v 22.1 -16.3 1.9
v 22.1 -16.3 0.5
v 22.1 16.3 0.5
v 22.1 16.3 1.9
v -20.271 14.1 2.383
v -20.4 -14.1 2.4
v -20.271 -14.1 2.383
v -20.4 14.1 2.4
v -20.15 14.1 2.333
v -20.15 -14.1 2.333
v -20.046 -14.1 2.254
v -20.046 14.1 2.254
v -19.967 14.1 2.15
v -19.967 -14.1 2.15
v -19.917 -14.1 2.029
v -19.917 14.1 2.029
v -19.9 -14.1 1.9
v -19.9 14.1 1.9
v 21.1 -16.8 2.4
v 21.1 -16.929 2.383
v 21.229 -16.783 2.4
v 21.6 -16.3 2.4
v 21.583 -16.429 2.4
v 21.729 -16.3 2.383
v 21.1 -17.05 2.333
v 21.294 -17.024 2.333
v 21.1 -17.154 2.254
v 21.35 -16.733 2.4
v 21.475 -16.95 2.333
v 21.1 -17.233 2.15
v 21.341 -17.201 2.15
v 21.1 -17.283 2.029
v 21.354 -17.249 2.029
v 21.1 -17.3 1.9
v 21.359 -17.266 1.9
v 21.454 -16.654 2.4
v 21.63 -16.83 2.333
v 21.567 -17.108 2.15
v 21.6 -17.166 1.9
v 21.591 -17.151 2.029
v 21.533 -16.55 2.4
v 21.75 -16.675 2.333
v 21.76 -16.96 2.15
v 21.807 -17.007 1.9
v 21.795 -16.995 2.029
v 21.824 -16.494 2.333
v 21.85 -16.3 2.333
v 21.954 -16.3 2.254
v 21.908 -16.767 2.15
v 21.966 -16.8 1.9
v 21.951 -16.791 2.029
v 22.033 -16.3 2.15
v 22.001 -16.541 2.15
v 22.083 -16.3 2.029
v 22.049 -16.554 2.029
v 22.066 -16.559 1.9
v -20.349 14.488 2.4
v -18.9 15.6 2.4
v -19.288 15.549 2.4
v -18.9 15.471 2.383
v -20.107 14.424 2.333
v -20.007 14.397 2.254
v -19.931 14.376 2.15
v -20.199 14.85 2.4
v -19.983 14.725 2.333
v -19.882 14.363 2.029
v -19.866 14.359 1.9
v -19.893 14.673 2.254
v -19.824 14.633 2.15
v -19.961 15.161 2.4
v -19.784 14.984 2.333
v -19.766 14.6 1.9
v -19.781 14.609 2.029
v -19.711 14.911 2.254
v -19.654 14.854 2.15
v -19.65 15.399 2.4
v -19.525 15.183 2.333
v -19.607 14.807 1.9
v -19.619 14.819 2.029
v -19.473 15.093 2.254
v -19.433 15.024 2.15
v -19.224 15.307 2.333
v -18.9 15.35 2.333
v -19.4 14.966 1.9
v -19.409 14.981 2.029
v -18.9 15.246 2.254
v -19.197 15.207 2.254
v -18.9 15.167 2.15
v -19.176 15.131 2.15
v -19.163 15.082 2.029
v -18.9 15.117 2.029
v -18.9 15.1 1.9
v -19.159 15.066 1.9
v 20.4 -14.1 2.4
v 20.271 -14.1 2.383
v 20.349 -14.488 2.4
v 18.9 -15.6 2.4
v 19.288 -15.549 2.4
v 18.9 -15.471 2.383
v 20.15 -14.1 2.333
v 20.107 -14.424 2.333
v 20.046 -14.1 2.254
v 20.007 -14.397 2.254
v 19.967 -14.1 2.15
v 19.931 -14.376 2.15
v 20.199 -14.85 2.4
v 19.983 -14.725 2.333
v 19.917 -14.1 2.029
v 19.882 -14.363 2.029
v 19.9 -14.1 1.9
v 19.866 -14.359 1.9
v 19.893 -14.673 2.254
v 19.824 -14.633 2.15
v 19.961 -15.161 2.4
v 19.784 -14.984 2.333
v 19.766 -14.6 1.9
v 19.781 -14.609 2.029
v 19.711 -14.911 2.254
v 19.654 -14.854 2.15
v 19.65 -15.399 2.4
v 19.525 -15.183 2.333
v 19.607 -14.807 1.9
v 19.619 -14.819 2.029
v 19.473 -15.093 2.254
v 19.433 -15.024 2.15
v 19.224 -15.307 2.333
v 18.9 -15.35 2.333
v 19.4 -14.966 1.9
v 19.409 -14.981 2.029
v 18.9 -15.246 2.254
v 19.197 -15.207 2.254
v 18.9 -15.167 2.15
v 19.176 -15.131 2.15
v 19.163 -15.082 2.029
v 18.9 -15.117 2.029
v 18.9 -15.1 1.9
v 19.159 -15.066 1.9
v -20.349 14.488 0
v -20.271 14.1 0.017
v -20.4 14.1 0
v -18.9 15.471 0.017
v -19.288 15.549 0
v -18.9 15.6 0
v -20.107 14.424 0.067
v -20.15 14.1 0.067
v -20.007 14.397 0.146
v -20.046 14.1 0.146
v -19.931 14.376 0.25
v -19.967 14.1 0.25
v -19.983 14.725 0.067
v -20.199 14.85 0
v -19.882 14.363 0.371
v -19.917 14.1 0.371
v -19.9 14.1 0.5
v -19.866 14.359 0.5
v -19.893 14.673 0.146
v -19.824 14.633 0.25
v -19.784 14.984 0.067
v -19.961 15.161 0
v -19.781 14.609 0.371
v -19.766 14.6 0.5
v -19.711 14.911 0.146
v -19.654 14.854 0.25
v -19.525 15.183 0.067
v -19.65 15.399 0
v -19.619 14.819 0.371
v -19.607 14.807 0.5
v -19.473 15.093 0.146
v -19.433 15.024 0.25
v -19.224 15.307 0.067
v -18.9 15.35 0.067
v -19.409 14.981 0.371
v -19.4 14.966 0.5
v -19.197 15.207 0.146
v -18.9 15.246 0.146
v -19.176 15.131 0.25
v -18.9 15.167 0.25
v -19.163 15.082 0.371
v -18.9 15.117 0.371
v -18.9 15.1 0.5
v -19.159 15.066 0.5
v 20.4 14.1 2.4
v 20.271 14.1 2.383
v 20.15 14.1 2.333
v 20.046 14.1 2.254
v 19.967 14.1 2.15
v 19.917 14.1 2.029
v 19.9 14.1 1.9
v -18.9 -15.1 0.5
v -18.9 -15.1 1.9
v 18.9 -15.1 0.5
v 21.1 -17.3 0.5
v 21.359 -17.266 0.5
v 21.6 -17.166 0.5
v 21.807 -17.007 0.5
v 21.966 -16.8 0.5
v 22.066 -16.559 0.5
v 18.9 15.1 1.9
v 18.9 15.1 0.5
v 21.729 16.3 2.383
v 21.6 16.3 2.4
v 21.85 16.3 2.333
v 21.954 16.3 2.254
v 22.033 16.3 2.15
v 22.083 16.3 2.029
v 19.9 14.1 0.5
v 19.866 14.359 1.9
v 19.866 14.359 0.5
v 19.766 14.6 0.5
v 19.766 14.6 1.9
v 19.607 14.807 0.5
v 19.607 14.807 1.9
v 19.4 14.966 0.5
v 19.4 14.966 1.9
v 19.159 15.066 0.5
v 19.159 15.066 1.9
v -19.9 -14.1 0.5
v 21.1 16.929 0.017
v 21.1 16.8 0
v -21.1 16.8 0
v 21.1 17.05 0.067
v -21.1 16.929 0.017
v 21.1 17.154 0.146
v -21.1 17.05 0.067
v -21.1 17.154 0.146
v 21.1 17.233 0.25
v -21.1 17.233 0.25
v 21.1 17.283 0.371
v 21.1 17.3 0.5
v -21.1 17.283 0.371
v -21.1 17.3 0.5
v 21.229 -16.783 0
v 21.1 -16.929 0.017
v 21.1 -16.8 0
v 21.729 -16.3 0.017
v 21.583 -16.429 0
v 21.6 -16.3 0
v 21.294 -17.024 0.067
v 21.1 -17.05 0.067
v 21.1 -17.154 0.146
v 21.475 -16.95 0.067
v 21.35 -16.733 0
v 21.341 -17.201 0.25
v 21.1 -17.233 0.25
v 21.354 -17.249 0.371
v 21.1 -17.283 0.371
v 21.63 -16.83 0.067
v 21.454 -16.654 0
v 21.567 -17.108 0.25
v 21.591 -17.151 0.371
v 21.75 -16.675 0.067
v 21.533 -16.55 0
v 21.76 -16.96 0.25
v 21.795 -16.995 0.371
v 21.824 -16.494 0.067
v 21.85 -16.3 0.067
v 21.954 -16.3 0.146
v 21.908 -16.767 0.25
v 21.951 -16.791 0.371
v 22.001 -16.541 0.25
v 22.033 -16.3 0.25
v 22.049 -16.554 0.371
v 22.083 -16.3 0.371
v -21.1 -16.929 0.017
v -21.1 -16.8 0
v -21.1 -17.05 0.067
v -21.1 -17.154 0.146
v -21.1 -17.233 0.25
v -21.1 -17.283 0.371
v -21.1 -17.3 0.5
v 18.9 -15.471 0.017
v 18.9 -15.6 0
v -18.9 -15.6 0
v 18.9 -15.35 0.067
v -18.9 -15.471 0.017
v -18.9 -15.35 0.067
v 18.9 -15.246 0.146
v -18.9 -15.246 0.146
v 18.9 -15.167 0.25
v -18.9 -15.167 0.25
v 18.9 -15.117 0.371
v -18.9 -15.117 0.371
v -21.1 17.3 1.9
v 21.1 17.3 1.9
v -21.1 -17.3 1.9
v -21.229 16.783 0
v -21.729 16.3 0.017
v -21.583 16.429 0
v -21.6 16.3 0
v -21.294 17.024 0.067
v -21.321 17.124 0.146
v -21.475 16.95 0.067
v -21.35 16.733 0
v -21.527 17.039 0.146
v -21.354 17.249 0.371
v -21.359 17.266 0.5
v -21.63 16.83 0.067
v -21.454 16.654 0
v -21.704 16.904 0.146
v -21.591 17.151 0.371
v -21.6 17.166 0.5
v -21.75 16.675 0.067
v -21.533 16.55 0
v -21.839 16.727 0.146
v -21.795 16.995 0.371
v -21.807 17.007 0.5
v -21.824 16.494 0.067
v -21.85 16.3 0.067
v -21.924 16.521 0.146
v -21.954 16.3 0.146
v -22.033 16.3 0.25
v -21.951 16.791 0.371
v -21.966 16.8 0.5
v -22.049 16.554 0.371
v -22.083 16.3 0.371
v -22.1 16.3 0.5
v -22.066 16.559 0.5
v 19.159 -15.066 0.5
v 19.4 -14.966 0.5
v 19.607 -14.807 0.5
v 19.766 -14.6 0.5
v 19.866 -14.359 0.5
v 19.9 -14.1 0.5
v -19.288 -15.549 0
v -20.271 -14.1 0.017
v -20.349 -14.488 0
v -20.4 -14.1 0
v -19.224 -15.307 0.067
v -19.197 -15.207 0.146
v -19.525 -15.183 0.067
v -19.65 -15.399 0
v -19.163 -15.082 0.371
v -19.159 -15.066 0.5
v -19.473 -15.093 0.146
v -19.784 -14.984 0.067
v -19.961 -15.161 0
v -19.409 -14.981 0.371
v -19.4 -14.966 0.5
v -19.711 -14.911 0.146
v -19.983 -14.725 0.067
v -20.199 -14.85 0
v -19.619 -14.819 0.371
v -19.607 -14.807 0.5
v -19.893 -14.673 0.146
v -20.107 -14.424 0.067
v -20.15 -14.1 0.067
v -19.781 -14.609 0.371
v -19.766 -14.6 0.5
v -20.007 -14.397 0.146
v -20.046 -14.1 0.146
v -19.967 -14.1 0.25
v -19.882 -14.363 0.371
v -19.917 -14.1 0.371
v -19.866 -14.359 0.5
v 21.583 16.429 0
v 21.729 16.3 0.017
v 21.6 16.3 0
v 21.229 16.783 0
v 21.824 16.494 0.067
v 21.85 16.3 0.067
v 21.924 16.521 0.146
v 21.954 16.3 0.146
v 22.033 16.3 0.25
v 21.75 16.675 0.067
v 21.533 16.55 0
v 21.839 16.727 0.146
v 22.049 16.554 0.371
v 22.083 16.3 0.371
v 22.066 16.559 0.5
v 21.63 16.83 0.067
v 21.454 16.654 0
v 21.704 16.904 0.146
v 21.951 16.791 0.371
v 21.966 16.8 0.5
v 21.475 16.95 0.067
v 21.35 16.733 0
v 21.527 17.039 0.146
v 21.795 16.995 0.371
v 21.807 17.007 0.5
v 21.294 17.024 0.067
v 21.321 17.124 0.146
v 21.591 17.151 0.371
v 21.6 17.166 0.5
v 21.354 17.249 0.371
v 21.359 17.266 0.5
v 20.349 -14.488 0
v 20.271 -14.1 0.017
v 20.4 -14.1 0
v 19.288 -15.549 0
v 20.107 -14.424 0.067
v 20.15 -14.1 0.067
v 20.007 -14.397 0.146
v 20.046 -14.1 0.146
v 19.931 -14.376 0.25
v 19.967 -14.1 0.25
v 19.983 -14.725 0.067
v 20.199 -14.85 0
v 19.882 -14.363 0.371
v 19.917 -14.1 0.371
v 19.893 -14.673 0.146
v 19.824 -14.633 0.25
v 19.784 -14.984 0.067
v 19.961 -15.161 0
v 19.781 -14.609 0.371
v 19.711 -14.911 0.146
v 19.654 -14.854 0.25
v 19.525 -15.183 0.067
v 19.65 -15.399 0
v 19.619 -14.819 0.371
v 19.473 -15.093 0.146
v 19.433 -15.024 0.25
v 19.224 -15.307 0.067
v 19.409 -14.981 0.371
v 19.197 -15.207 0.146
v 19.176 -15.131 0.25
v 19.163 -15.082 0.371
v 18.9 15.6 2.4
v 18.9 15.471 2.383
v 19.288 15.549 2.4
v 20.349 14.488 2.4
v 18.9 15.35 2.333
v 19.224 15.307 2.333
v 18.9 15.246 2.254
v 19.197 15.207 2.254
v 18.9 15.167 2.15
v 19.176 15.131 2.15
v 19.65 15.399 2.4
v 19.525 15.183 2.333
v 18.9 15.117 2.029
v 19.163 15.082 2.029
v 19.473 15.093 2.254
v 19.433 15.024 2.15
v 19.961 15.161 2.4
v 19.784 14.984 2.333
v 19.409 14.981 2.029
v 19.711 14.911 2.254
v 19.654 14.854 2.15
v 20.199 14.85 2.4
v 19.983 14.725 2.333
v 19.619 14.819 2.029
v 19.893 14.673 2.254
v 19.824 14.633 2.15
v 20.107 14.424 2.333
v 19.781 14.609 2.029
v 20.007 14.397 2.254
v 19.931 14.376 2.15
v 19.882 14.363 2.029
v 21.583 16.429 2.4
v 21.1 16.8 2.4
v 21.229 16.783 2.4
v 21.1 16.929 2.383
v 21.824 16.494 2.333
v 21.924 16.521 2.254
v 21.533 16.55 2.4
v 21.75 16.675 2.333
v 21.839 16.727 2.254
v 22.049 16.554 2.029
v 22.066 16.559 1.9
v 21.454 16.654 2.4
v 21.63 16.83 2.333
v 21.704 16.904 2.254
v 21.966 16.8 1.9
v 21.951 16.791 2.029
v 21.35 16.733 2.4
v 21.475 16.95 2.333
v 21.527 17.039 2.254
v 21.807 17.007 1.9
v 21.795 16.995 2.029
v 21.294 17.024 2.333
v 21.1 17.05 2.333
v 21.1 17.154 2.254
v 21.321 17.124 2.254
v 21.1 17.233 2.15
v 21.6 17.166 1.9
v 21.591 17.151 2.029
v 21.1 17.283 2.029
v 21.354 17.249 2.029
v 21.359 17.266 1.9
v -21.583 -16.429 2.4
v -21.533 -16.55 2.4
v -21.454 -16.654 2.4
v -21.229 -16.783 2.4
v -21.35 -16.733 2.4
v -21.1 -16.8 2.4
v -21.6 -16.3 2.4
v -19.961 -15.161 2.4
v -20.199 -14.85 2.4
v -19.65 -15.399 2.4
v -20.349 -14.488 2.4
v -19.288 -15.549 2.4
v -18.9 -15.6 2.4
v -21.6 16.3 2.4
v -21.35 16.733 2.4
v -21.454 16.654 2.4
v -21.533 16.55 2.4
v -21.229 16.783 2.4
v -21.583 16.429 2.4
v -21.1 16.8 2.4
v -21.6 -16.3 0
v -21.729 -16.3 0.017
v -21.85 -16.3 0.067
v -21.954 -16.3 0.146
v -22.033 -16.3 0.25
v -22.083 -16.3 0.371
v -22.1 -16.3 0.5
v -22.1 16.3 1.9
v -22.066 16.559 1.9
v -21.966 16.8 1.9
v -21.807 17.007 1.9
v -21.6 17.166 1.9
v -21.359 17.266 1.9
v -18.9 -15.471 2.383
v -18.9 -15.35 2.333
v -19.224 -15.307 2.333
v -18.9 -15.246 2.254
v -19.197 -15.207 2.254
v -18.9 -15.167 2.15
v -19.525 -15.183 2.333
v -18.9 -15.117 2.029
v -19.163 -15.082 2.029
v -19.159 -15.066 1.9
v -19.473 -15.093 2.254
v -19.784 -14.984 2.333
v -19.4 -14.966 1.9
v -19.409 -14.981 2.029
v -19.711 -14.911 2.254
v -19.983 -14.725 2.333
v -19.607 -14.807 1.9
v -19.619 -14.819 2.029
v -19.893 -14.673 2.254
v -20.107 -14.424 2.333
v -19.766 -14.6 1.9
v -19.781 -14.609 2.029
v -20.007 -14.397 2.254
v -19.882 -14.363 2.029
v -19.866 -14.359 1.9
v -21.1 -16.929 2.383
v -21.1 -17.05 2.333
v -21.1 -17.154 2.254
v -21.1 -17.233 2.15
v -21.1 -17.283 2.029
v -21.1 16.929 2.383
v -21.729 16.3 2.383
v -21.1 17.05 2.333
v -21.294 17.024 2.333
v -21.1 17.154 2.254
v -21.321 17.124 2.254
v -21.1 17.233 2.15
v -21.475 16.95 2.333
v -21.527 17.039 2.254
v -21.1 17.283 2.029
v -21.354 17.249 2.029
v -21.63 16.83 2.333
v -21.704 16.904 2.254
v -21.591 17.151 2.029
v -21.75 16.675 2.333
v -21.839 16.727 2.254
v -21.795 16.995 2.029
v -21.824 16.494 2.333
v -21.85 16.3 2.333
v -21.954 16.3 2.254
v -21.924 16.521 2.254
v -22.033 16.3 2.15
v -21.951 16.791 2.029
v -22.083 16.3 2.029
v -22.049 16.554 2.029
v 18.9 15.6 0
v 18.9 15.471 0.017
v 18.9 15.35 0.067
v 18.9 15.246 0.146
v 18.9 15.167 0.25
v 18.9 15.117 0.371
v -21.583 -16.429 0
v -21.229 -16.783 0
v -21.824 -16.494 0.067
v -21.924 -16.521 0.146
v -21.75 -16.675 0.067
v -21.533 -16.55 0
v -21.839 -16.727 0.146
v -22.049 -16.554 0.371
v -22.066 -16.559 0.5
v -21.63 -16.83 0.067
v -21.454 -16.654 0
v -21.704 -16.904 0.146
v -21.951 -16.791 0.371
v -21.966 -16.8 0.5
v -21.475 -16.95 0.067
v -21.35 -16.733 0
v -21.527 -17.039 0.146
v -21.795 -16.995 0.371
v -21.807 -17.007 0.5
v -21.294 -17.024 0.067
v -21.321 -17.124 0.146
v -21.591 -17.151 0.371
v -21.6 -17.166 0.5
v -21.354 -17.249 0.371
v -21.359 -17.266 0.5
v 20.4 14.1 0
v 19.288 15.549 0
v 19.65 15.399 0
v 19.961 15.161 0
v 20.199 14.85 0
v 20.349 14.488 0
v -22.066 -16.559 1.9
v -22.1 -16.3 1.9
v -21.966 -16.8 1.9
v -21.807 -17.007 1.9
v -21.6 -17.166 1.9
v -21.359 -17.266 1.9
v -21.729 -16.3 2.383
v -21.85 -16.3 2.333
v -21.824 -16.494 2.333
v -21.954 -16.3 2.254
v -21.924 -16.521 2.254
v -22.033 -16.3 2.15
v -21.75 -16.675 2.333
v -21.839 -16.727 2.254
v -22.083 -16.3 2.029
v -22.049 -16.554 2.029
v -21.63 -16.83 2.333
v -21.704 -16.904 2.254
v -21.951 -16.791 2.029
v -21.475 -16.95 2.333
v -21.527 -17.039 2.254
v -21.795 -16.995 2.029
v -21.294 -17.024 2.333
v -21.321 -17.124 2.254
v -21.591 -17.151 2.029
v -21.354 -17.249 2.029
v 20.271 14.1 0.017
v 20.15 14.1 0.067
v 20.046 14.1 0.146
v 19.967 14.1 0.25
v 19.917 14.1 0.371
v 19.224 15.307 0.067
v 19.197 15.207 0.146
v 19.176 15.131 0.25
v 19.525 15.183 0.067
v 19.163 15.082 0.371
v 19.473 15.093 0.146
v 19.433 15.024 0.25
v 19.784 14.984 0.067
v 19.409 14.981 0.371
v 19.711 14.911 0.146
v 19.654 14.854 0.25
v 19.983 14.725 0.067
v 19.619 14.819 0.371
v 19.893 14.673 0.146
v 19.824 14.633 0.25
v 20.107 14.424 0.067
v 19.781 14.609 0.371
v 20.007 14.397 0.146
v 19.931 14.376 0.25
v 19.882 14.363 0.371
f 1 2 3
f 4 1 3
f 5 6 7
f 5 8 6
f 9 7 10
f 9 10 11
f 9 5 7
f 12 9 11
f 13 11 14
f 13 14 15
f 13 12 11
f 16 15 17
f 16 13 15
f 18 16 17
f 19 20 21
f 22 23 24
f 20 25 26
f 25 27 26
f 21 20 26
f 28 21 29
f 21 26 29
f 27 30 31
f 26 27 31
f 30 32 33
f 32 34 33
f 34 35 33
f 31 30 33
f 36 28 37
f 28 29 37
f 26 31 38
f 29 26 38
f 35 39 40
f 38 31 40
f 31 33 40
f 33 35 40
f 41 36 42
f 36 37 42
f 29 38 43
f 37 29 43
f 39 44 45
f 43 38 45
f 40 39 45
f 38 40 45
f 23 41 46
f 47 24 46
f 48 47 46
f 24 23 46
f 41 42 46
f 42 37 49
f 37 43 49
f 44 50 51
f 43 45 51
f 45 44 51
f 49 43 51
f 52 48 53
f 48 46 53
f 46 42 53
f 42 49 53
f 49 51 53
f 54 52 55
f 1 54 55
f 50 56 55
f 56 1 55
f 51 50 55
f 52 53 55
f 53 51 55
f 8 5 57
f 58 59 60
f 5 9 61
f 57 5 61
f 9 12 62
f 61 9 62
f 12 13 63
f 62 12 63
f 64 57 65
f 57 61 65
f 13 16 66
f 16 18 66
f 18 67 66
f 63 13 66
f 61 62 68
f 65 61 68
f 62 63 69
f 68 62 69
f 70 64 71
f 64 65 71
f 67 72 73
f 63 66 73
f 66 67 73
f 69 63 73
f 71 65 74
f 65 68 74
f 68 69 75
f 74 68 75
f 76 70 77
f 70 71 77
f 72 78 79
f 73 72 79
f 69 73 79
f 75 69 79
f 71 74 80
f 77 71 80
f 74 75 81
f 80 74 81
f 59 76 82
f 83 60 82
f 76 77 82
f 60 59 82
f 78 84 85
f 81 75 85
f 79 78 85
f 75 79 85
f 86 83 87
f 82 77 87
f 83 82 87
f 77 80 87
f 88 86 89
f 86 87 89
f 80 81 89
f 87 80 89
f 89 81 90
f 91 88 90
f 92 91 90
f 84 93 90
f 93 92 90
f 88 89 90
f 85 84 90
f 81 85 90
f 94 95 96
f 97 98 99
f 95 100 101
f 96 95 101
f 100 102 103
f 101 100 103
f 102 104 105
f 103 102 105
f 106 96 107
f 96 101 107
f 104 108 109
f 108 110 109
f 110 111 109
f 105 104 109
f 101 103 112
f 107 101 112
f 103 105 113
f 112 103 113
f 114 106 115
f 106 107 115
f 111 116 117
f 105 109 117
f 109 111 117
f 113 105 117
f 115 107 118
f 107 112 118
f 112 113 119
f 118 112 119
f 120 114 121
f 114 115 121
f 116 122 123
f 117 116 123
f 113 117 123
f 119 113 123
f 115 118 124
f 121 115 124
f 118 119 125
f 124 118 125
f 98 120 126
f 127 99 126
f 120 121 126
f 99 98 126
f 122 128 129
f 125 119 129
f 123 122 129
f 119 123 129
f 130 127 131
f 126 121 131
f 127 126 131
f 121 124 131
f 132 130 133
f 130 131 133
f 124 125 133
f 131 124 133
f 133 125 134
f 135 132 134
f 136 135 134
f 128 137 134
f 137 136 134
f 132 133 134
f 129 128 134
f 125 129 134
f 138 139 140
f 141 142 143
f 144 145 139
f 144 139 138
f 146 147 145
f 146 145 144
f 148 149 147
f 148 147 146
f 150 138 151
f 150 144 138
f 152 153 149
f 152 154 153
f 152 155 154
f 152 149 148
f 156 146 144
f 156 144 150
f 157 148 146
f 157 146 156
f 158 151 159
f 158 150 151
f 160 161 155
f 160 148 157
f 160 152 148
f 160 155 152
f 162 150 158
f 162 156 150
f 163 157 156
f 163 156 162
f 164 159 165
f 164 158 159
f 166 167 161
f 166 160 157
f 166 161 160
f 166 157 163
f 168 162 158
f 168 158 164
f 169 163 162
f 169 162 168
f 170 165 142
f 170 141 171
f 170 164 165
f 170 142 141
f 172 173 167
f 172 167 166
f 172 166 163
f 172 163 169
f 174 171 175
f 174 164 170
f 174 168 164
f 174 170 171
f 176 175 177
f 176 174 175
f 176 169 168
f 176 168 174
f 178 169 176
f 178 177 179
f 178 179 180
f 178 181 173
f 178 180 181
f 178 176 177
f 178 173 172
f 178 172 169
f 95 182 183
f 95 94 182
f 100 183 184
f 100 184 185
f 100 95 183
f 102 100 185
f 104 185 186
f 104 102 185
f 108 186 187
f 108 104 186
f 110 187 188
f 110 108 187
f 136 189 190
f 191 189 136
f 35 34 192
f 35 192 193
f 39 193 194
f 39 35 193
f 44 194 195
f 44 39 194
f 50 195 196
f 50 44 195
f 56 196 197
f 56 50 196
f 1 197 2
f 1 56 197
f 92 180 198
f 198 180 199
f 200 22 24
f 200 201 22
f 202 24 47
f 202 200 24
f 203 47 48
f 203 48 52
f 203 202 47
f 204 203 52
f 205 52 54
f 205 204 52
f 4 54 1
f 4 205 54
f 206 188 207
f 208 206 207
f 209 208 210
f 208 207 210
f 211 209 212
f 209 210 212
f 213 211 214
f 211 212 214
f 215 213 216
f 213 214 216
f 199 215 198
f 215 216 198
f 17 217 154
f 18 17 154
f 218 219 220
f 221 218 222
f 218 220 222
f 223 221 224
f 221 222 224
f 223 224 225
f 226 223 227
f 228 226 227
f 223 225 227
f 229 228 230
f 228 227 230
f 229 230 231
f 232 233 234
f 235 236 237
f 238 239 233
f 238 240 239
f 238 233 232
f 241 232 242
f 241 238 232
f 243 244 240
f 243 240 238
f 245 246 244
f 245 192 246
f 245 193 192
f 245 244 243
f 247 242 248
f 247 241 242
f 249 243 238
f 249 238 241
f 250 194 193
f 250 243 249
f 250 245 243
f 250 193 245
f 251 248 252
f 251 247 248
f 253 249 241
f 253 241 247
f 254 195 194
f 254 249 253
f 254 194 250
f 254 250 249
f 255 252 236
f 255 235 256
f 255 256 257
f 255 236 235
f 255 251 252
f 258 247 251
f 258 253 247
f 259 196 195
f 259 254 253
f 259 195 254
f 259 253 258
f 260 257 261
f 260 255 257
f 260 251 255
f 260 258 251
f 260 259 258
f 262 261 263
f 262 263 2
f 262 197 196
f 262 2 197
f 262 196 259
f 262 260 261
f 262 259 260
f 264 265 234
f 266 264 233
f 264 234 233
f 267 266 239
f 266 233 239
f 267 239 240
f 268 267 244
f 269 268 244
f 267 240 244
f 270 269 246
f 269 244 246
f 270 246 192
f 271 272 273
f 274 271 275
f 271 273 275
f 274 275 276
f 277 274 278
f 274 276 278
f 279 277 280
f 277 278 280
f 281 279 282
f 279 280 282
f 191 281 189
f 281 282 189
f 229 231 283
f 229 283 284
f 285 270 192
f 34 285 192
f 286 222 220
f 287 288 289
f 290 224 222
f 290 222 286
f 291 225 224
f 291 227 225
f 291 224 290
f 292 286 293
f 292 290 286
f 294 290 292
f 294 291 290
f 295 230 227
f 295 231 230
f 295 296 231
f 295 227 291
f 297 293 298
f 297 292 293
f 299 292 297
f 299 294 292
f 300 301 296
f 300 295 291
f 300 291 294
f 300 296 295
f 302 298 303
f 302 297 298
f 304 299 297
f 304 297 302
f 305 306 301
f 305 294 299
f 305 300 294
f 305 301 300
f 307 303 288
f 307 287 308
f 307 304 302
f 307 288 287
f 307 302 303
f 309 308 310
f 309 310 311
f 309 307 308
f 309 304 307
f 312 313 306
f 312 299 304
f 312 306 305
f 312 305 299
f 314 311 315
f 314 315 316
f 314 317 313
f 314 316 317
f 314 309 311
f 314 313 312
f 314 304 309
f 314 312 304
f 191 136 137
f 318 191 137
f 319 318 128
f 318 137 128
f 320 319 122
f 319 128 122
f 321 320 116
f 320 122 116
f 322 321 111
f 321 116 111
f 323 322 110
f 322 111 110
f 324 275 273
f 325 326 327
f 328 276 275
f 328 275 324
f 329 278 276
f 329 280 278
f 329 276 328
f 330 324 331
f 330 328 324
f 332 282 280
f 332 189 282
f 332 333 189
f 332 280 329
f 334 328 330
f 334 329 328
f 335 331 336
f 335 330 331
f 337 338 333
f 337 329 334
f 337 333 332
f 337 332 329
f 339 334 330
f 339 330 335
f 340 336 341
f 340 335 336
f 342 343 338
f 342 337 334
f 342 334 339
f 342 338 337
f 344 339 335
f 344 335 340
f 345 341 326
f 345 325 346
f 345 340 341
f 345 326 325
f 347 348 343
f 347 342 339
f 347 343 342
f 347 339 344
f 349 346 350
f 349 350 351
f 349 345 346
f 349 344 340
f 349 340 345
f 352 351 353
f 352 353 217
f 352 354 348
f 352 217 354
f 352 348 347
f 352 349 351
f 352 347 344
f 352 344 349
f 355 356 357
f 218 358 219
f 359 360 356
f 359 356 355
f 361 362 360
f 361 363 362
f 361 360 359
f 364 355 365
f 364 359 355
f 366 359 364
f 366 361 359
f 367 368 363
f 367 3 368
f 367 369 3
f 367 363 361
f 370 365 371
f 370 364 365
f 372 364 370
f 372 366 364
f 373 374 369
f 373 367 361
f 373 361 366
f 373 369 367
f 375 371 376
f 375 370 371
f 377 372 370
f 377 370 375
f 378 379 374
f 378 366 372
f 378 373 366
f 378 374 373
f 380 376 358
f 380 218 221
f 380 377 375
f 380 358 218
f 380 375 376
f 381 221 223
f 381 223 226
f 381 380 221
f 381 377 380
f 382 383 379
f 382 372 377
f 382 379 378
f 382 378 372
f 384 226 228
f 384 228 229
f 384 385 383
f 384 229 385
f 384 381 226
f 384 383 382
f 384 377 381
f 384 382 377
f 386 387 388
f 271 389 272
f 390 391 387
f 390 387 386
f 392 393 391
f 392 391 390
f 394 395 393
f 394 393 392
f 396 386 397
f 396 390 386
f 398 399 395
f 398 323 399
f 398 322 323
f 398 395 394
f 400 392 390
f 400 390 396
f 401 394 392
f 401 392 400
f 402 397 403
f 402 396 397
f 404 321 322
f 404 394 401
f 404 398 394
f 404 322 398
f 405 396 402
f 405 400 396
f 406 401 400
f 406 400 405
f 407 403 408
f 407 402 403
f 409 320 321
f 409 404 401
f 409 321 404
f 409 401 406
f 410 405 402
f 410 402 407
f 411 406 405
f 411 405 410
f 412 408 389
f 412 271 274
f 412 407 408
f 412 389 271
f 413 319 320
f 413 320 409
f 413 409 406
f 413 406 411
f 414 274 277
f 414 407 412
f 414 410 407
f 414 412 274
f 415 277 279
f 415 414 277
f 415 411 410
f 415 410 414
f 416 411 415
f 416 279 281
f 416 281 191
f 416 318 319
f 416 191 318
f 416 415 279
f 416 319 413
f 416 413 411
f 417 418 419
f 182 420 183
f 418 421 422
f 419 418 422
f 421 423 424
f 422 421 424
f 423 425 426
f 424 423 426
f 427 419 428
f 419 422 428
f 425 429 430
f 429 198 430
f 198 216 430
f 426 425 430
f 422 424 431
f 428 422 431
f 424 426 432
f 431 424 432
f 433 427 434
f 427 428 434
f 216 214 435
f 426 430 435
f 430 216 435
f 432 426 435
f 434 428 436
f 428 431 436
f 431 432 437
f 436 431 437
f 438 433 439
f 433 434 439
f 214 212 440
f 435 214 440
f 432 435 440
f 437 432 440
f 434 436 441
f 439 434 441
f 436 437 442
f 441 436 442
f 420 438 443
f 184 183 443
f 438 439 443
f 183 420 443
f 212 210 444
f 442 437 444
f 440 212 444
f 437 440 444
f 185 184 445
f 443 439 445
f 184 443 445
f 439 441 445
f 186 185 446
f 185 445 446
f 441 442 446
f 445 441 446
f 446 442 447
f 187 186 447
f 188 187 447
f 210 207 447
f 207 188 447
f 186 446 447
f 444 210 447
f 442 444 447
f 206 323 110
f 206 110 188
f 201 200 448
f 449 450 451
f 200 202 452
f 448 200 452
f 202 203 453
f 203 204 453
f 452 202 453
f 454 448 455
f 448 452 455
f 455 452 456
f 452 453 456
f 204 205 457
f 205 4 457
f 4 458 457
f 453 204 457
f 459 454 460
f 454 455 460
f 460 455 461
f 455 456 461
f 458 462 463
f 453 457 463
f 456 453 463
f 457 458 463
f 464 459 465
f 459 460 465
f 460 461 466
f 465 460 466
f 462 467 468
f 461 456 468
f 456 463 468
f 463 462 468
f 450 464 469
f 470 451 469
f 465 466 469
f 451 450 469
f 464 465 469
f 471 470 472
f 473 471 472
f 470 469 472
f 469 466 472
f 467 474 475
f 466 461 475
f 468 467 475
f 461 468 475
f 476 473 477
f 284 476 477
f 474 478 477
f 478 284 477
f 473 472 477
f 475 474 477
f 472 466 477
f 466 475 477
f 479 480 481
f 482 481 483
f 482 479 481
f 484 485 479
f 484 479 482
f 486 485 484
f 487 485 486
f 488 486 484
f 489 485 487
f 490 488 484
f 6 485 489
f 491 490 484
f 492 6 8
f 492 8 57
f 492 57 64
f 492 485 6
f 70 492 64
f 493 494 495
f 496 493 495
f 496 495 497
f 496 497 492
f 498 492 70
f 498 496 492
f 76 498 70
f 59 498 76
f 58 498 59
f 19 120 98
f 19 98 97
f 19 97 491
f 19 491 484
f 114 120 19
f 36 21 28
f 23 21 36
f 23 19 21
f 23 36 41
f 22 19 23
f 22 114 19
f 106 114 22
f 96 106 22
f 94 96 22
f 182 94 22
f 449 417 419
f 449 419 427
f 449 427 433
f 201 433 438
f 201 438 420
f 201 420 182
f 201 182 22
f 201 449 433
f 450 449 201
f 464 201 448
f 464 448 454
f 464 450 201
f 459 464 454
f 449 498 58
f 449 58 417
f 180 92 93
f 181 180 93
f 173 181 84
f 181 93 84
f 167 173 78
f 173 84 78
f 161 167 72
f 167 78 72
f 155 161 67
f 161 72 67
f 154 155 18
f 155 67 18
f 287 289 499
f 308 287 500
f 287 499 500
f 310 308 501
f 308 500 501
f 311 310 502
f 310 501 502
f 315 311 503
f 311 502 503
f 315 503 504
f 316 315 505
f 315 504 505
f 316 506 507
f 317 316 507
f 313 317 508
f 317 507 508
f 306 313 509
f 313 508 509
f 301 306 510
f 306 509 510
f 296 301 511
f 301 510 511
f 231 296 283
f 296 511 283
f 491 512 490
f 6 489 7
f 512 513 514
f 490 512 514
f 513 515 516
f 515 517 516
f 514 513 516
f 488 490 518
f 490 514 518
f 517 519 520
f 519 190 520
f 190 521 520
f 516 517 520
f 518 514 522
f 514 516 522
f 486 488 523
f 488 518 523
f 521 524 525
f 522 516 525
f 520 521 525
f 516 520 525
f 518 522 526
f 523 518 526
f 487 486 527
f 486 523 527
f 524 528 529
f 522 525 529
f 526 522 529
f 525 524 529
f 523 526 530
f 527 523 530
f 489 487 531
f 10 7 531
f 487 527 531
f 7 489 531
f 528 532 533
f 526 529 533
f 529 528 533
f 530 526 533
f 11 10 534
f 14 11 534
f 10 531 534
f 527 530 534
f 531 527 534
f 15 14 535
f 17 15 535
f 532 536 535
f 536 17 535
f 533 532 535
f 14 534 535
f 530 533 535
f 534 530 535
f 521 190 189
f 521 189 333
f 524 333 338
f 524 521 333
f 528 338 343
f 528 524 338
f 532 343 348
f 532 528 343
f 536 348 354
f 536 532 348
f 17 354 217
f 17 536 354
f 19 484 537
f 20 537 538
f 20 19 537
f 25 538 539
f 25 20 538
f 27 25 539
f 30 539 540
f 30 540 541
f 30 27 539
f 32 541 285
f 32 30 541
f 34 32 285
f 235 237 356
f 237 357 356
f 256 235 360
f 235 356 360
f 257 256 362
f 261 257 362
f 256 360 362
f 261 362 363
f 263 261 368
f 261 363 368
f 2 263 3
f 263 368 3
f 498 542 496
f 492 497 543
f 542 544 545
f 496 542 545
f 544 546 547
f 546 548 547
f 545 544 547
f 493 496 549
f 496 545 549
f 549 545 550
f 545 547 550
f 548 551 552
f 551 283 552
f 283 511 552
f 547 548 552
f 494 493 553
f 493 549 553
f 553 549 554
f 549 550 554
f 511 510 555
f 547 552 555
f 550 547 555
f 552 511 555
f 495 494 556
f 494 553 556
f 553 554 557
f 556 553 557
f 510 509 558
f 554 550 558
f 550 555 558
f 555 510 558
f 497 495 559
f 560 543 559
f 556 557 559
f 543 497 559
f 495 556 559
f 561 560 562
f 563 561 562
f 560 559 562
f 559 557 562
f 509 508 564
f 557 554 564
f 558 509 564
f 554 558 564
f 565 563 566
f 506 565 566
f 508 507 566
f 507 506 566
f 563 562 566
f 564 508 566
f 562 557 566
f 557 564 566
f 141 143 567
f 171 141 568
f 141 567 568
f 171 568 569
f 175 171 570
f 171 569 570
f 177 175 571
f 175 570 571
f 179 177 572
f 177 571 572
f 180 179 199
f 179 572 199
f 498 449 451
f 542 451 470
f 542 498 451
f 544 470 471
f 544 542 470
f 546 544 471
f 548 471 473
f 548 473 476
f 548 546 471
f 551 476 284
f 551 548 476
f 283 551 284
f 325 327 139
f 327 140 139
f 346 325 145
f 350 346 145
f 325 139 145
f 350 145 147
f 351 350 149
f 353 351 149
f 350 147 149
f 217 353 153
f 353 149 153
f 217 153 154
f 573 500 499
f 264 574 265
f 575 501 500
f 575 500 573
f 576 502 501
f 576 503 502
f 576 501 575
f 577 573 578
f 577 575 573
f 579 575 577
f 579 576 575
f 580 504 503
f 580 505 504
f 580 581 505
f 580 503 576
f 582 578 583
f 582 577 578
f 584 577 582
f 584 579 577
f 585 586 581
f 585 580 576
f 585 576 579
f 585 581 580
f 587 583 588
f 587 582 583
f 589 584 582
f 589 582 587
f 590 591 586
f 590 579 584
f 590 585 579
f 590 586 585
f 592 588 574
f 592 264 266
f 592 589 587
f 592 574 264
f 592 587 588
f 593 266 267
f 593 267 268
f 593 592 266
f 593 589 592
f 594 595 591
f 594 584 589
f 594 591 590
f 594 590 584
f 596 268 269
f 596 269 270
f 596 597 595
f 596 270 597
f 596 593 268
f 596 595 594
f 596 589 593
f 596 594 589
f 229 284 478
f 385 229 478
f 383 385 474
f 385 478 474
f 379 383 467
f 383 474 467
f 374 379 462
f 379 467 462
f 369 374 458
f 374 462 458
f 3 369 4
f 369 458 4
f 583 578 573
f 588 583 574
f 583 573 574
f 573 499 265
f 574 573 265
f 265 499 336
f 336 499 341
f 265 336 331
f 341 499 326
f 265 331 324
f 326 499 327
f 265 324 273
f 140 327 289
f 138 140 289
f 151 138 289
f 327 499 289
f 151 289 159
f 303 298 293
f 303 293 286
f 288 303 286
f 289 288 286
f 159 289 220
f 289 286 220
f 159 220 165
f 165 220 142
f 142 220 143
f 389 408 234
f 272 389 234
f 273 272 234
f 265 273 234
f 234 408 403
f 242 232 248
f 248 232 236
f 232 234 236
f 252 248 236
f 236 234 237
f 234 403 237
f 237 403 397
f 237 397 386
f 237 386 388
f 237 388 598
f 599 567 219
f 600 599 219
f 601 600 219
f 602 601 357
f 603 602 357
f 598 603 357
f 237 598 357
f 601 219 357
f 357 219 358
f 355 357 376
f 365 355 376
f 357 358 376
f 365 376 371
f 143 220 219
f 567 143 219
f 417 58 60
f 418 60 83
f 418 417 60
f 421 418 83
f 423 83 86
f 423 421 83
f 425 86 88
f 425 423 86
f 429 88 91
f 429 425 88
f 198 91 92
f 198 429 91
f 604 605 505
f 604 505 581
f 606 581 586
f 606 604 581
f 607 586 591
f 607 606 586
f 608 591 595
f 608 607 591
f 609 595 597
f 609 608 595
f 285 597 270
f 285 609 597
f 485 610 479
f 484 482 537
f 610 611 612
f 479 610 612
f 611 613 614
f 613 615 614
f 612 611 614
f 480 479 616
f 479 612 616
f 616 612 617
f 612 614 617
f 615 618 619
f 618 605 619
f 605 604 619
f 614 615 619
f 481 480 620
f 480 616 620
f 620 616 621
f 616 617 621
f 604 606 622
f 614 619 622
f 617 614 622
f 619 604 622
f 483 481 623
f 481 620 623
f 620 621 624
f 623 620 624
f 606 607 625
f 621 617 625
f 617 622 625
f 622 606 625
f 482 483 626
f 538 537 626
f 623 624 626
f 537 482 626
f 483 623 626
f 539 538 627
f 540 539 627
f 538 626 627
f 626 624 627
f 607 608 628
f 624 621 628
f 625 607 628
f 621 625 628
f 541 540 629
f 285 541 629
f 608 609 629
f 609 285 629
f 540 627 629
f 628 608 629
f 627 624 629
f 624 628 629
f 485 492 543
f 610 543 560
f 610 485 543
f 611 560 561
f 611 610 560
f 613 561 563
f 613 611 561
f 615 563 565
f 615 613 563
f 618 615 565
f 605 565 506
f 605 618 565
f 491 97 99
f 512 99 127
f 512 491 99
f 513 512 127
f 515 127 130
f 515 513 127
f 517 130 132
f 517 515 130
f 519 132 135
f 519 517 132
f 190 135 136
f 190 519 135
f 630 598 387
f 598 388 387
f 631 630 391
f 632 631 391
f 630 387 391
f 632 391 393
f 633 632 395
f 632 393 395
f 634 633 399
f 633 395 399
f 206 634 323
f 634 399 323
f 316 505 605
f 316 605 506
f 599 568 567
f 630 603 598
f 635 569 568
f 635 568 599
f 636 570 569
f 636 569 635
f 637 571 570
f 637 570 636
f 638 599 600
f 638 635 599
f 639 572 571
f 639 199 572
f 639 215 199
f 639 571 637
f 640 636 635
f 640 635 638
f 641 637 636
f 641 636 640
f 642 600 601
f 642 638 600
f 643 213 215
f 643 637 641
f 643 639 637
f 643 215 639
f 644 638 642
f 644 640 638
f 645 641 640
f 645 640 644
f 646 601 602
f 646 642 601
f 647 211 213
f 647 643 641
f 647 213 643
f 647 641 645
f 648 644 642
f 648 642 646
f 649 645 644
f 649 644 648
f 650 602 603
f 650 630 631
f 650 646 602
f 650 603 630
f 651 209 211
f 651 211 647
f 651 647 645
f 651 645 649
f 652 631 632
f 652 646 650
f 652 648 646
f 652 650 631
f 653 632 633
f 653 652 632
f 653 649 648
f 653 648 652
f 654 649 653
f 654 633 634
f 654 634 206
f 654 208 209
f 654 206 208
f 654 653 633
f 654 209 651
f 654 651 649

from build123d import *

# Parameters (mm, degrees)
F0_W     = 44.2
F0_H     = 34.6
F0_W_2   = 39.8
F0_H_2   = 30.2
F1_DEPTH = 2.4
F2_R     = 1
F3_R     = 0.5


with BuildPart() as f1:
    # F0 (on Top) → F1 (new body)
    with BuildSketch(Plane.XY):
        Rectangle(F0_W, F0_H)
        Rectangle(F0_W_2, F0_H_2, mode=Mode.SUBTRACT)
    extrude(amount=F1_DEPTH)

    # F2
    f2_edges = [f1.edges().sort_by_distance(p)[0] for p in [
        (22.1, -17.3, 1.2),
        (19.9, -15.1, 1.2),
        (-22.1, -17.3, 1.2),
        (19.9, 15.1, 1.2),
        (-22.1, 17.3, 1.2),
        (-19.9, 15.1, 1.2),
        (-19.9, -15.1, 1.2),
        (22.1, 17.3, 1.2),
    ]]
    fillet(f2_edges, radius=F2_R)

    # F3
    f3_edges = [f1.edges().sort_by_distance(p)[0] for p in [
        (22.1, 0, 2.4),
        (21.807107, -17.007107, 2.4),
        (21.807107, 17.007107, 2.4),
        (0, -17.3, 2.4),
        (0, 17.3, 2.4),
        (-21.807107, -17.007107, 2.4),
        (-21.807107, 17.007107, 2.4),
        (-22.1, 0, 2.4),
        (-19.9, 0, 2.4),
        (-19.607107, -14.807107, 2.4),
        (-19.607107, 14.807107, 2.4),
        (0, -15.1, 2.4),
        (0, 15.1, 2.4),
        (19.607107, -14.807107, 2.4),
        (19.607107, 14.807107, 2.4),
        (19.9, 0, 2.4),
        (22.1, 0, 0),
        (21.807107, -17.007107, 0),
        (21.807107, 17.007107, 0),
        (0, -17.3, 0),
        (0, 17.3, 0),
        (-21.807107, -17.007107, 0),
        (-21.807107, 17.007107, 0),
        (-22.1, 0, 0),
        (-19.9, 0, 0),
        (-19.607107, -14.807107, 0),
        (-19.607107, 14.807107, 0),
        (0, -15.1, 0),
        (0, 15.1, 0),
        (19.607107, -14.807107, 0),
        (19.607107, 14.807107, 0),
        (19.9, 0, 0),
    ]]
    fillet(f3_edges, radius=F3_R)


solid = f1.part
